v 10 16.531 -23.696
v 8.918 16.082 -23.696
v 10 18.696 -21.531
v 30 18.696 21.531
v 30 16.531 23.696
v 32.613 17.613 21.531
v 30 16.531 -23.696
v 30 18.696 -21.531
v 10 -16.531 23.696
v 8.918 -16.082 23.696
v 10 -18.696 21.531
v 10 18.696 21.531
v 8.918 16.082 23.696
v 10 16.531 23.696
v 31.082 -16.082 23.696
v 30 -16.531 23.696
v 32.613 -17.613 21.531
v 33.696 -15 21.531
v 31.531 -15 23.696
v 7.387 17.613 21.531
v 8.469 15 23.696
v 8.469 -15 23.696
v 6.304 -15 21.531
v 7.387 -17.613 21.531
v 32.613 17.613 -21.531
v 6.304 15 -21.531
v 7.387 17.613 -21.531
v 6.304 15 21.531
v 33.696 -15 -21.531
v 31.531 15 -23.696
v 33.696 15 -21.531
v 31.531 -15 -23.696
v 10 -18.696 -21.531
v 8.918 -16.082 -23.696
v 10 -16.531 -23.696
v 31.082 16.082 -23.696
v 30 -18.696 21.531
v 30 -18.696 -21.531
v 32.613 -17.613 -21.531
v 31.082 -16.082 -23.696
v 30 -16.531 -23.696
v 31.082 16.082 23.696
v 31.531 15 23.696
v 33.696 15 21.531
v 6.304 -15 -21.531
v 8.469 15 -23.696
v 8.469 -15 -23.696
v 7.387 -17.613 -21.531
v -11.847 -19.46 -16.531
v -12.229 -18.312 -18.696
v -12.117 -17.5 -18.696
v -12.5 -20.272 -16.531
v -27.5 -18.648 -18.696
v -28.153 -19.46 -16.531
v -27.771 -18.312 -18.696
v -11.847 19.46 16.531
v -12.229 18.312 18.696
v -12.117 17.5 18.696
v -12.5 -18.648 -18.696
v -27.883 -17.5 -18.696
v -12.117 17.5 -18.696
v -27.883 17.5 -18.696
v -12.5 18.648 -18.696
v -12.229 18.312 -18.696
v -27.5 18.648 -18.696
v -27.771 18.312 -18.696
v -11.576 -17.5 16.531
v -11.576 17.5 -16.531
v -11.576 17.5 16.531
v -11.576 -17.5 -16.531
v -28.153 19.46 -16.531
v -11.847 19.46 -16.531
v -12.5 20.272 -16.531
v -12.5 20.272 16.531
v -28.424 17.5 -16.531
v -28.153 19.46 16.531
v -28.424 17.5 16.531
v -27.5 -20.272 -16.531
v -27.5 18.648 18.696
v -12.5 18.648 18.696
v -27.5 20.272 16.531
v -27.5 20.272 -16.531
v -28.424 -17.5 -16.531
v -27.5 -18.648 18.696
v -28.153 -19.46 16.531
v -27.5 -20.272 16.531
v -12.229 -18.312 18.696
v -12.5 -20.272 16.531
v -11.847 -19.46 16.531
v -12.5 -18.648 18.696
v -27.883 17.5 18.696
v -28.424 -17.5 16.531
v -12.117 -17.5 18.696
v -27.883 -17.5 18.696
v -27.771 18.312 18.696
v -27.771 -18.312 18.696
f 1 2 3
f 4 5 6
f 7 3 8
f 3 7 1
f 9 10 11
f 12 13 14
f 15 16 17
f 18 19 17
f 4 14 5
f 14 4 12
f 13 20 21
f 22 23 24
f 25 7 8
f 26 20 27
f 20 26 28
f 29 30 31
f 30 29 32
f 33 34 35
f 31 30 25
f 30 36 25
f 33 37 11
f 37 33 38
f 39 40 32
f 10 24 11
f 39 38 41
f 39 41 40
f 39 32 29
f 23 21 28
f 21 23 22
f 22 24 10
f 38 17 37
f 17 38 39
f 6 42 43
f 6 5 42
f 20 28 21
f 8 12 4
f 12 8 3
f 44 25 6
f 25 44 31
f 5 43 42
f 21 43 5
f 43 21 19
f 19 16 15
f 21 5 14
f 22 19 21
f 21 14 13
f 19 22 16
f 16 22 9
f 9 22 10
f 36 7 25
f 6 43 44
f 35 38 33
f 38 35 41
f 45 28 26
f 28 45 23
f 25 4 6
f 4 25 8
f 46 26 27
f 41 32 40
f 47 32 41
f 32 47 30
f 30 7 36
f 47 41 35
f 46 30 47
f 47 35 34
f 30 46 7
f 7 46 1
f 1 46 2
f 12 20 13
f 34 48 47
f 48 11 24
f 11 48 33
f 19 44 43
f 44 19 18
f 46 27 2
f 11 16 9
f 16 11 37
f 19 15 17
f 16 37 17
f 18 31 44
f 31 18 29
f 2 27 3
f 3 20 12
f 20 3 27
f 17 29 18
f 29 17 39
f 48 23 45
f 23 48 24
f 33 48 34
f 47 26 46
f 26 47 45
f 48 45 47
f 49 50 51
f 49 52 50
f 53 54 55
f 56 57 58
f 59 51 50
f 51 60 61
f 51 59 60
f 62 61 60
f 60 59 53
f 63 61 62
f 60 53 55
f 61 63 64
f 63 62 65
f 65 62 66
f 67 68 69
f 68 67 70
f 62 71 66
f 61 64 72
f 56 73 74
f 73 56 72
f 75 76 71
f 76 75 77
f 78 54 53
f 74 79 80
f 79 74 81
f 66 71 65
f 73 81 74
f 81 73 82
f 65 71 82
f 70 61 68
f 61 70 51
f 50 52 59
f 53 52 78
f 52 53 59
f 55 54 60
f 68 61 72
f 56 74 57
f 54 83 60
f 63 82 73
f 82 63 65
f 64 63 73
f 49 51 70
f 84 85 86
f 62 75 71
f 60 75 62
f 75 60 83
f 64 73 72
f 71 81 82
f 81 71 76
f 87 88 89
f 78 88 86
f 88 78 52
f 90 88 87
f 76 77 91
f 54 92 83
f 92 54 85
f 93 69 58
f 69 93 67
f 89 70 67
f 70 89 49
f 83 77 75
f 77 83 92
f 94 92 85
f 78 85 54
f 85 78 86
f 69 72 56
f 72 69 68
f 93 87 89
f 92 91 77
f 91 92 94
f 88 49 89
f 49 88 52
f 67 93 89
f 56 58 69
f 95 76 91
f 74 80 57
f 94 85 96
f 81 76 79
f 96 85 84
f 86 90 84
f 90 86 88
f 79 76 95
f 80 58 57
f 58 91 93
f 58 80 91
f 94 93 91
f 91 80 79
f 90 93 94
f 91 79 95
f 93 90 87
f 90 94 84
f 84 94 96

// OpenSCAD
// file: ../scad/modules/roundedCube.scad
module Corner(bevelDimensions, bevelRadius) {
  if(is_undef(bevelDimensions))
    sphere(r = bevelRadius);
  else
    scale(bevelDimensions) sphere(r = 1);
};

module RoundedCube(dimensions, bevelDimensions, bevelRadius = 1) {
  hull() {
    translate([dimensions.x / 2, dimensions.y / 2, dimensions.z / 2])
      Corner(bevelDimensions, bevelRadius);
    translate([-dimensions.x / 2, dimensions.y / 2, dimensions.z / 2])
      Corner(bevelDimensions, bevelRadius);
    translate([-dimensions.x / 2, -dimensions.y / 2, dimensions.z / 2])
      Corner(bevelDimensions, bevelRadius);
    translate([dimensions.x / 2, -dimensions.y / 2, dimensions.z / 2])
      Corner(bevelDimensions, bevelRadius);
    translate([dimensions.x / 2, dimensions.y / 2, -dimensions.z / 2])
      Corner(bevelDimensions, bevelRadius);
    translate([-dimensions.x / 2, dimensions.y / 2, -dimensions.z / 2])
      Corner(bevelDimensions, bevelRadius);
    translate([-dimensions.x / 2, -dimensions.y / 2, -dimensions.z / 2])
      Corner(bevelDimensions, bevelRadius);
    translate([dimensions.x / 2, -dimensions.y / 2, -dimensions.z / 2])
      Corner(bevelDimensions, bevelRadius);
  }
};
// main file
use <../scad/modules/roundedCube.scad>
$fn = 8;

translate([20, 0, 0])
  RoundedCube(dimensions = [20, 30, 40], bevelRadius = 4);

translate([-20, 0, 0])
  RoundedCube(dimensions = [15, 35, 30], bevelDimensions = [1, 3, 4]);
